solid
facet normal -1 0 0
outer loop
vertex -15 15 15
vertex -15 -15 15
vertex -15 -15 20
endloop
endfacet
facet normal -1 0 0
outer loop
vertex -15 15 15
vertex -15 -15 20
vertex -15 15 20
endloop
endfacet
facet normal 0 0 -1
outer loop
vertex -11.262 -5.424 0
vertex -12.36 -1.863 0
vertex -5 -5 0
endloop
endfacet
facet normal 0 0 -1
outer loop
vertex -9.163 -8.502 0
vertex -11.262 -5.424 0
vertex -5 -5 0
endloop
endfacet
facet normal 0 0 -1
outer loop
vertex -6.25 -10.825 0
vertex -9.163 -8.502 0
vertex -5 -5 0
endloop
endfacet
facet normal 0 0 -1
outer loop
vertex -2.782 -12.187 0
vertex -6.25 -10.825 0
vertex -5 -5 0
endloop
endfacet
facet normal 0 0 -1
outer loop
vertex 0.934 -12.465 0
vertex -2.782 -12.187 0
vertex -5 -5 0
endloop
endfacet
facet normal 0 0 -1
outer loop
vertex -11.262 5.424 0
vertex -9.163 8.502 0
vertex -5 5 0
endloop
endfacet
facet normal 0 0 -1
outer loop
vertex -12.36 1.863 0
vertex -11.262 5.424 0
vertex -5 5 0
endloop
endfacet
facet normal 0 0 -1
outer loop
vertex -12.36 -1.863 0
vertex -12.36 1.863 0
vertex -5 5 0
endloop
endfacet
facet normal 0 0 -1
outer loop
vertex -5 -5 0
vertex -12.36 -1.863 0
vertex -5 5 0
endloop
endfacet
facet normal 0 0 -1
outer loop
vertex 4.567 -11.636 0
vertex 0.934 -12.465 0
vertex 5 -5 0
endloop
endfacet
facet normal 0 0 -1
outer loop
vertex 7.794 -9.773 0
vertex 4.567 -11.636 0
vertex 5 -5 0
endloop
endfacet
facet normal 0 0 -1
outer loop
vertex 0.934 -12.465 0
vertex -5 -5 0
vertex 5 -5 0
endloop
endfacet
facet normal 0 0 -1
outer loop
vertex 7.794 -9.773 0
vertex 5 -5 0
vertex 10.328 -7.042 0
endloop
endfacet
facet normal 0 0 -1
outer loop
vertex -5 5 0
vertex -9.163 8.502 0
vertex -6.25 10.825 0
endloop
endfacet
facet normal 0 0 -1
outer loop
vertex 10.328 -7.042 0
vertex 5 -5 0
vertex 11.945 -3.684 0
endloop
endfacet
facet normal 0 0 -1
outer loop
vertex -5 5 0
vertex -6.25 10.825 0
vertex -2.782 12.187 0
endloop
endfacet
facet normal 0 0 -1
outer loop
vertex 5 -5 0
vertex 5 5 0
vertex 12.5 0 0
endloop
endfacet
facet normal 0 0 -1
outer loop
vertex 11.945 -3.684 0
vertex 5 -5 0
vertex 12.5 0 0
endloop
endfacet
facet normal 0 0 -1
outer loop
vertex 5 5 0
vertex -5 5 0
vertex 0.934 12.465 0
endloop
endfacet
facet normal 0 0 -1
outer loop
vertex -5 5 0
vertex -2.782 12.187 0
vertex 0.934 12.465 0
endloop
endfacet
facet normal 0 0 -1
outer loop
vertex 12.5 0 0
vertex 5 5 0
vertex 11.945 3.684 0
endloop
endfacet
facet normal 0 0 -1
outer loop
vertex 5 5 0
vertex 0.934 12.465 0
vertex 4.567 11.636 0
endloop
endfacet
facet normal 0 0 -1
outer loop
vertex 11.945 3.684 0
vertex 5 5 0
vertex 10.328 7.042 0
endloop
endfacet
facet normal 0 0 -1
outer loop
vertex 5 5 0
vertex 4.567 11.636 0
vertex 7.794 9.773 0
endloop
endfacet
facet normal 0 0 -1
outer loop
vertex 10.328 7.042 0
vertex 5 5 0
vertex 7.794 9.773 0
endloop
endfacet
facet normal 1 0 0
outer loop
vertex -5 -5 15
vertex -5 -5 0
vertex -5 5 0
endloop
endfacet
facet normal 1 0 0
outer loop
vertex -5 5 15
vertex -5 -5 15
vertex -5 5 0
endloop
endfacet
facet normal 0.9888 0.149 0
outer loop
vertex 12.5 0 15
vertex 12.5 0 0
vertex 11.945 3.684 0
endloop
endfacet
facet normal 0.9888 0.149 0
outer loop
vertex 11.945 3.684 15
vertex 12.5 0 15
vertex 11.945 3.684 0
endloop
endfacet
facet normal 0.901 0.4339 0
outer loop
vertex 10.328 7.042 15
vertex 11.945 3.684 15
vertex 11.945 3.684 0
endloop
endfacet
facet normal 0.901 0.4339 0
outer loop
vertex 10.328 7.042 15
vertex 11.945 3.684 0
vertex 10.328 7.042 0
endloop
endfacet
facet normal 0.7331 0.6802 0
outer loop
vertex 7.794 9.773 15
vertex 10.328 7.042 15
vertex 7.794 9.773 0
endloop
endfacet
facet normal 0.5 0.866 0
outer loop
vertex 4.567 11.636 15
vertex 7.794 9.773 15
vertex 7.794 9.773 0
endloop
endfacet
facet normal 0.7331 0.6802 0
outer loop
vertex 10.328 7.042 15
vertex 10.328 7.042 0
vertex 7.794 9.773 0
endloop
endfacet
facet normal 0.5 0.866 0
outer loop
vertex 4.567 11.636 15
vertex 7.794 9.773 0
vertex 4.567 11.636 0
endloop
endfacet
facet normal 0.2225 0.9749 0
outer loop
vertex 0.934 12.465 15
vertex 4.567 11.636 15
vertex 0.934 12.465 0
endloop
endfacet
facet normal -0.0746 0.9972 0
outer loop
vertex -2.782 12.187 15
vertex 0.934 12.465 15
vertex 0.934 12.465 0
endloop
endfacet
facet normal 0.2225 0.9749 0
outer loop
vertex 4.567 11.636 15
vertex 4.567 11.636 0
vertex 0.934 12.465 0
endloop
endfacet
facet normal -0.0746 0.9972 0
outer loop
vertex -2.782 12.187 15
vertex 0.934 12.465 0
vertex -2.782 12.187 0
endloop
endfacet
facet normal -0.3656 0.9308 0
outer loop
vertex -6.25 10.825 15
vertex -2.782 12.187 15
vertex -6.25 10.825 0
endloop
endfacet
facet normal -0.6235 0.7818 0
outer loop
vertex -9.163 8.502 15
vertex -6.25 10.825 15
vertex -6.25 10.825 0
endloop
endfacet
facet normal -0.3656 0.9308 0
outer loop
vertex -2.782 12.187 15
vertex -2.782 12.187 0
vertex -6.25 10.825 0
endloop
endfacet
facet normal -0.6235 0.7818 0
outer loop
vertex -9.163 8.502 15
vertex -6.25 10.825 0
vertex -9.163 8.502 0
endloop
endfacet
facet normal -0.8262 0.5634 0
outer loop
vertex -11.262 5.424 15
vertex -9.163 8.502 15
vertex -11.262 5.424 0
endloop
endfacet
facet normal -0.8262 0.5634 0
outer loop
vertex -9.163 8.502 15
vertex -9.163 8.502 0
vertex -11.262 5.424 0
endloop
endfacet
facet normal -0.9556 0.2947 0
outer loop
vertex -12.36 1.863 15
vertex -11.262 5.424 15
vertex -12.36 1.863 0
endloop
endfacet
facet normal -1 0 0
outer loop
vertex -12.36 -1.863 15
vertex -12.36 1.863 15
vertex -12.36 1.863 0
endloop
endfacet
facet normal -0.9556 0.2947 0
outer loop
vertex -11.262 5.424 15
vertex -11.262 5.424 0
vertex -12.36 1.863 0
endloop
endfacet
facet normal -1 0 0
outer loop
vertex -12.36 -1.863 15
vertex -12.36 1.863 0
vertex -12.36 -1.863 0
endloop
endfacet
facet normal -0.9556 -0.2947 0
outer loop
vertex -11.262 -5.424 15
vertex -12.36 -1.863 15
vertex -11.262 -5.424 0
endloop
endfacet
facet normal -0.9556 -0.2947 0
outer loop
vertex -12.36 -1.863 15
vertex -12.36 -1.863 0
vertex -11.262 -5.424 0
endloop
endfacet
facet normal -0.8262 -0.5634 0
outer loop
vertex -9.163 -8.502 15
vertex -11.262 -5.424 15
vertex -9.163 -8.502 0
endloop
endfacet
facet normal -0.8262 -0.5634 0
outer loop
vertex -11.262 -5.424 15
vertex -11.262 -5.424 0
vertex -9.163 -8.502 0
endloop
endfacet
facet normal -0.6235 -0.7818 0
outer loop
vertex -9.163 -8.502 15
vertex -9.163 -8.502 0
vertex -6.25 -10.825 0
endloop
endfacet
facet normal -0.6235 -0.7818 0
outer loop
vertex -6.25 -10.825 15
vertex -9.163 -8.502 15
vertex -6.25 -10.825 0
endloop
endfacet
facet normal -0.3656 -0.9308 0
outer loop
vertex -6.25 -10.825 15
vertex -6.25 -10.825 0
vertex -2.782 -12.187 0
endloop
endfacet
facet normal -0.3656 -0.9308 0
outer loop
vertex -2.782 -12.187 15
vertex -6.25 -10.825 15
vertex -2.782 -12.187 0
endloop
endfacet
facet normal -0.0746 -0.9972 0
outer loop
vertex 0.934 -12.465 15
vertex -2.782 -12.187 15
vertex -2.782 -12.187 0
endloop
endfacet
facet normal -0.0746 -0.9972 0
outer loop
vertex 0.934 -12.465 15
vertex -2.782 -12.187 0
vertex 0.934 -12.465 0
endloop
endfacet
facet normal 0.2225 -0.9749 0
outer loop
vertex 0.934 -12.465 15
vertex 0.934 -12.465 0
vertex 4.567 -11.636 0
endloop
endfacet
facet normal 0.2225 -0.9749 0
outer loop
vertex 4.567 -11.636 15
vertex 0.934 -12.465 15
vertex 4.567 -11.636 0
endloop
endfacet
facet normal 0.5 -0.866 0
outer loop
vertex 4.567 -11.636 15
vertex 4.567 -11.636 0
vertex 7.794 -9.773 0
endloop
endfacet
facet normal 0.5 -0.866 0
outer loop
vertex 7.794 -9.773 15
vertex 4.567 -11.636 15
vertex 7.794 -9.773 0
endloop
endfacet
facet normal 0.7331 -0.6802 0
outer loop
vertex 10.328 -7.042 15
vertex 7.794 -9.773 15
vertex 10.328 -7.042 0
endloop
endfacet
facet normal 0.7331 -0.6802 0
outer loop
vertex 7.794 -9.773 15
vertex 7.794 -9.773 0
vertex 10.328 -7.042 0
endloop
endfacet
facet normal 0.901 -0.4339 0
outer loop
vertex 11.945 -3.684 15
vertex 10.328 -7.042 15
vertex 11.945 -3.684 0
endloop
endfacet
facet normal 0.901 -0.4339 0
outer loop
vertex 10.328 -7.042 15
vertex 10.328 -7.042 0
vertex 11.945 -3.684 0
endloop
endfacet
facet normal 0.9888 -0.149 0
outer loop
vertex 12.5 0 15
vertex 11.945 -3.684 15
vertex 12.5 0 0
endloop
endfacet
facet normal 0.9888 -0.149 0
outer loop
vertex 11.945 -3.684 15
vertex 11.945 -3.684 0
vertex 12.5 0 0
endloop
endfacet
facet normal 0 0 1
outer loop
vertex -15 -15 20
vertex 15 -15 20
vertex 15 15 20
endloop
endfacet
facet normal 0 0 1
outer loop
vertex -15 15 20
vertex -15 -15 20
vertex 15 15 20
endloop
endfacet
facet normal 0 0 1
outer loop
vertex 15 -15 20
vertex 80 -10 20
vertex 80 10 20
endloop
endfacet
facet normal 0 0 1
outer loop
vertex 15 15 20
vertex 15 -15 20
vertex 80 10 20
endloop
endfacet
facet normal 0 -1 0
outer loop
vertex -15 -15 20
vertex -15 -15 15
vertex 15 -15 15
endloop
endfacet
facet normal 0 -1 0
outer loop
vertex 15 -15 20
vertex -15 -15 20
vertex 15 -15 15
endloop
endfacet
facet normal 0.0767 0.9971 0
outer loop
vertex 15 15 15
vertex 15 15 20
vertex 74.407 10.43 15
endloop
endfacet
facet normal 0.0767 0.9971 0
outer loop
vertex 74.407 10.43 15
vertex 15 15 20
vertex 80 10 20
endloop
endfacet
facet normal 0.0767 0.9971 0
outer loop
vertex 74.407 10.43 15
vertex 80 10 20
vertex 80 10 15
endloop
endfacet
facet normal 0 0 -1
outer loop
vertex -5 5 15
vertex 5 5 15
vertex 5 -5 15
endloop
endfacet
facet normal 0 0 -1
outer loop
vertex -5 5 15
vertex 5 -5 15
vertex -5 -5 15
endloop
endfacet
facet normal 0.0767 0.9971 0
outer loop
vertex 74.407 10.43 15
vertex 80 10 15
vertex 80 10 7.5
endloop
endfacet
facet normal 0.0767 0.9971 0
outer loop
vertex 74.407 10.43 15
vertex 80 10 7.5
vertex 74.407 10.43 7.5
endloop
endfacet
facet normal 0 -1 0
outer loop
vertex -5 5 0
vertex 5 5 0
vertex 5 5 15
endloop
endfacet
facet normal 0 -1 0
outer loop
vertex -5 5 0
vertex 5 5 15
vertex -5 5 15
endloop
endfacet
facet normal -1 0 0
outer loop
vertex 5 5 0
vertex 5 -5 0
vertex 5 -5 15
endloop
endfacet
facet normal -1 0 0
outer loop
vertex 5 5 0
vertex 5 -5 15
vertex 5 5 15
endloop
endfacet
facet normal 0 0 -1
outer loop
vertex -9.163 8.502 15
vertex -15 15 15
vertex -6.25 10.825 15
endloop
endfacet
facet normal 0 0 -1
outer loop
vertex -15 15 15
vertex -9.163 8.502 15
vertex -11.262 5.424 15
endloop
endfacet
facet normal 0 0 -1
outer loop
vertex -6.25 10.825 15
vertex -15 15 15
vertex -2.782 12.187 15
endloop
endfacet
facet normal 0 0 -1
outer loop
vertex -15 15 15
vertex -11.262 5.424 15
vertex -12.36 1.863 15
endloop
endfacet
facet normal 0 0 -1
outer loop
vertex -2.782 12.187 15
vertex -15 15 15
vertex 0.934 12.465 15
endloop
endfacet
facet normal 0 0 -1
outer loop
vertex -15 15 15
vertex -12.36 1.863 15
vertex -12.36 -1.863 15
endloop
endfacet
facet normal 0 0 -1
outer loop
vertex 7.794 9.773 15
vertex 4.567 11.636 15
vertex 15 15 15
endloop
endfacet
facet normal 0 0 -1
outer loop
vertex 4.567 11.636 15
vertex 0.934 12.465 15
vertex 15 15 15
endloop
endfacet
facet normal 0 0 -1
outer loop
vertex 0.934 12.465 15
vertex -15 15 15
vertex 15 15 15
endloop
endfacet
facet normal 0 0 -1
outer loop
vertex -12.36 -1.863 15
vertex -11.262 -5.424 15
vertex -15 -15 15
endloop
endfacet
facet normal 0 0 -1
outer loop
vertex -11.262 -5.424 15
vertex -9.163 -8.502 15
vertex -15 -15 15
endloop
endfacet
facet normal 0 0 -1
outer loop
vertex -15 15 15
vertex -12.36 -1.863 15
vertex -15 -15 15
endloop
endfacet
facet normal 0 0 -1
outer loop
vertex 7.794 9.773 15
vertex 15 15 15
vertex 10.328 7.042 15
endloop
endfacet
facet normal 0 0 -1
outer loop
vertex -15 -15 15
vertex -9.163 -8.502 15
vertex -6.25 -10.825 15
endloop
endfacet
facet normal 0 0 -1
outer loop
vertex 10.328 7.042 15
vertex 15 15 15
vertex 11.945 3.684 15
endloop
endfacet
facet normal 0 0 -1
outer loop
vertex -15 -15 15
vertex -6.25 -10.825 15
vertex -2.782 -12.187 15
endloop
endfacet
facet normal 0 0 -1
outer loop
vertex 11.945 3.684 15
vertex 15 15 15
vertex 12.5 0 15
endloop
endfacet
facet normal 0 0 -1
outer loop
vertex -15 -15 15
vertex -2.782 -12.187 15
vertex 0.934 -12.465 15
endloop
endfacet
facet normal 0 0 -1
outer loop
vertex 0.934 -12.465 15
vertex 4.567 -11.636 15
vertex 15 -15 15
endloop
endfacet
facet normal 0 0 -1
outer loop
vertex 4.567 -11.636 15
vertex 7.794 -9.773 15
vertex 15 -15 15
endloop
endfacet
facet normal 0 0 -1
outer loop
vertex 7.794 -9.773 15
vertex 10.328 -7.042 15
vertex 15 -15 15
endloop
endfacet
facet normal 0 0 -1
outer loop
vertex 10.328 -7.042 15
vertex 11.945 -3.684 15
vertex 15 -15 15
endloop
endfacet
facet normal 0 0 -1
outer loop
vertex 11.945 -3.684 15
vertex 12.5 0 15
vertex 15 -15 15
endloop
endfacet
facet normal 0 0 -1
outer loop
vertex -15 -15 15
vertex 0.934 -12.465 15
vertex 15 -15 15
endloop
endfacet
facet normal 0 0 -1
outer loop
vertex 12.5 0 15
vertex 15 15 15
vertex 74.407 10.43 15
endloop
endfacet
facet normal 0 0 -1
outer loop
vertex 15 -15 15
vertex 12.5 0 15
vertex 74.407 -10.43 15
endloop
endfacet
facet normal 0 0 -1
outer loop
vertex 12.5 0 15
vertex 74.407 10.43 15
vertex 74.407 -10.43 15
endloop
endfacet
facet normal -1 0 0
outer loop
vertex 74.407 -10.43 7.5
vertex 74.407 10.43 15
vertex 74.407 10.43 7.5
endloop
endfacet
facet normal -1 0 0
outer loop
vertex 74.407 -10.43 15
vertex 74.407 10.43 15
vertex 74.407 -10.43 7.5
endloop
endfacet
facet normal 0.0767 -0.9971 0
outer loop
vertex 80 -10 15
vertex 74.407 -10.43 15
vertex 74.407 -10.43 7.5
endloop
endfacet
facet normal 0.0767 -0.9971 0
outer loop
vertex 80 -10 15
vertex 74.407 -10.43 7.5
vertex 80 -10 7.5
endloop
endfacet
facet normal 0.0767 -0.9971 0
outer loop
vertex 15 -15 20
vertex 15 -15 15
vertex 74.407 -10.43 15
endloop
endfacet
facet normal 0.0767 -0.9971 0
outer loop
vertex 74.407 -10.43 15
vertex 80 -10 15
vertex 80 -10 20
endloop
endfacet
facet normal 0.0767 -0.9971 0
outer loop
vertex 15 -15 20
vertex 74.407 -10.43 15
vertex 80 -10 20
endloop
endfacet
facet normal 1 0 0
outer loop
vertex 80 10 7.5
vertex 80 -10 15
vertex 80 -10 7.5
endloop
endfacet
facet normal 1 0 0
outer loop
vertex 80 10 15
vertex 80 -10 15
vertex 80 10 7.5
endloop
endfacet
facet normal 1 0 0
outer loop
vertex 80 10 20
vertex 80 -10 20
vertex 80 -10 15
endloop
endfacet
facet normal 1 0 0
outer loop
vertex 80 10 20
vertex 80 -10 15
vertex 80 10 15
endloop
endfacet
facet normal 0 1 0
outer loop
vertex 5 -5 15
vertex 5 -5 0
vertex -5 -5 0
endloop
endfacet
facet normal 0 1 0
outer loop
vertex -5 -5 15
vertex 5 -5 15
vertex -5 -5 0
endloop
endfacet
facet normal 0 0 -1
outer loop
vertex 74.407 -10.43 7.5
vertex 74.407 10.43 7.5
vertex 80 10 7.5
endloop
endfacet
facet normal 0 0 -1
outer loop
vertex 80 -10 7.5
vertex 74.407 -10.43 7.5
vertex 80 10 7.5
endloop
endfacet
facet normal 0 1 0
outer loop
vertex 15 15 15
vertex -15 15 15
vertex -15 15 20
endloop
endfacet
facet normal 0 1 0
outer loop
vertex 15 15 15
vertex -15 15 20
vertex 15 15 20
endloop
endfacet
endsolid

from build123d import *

# Parameters (mm, degrees)
SKETCH2_R           = 12.5
BOSS_EXTRUDE1_DEPTH = 15
SKETCH3_W           = 30
SKETCH3_H           = 30
BOSS_EXTRUDE2_DEPTH = 5
SKETCH6_W           = 10
SKETCH6_H           = 10
CUT_EXTRUDE1_DEPTH  = 15
BOSS_EXTRUDE3_DEPTH = 7.5


with BuildPart() as part:
    # Sketch2 → Boss-Extrude1 (new body)
    with BuildSketch(Plane.XY):
        Circle(SKETCH2_R)
    extrude(amount=BOSS_EXTRUDE1_DEPTH)

    # Sketch3 → Boss-Extrude2 (add)
    with BuildSketch(Plane.XY.offset(15)):
        Rectangle(SKETCH3_W, SKETCH3_H)
    extrude(amount=BOSS_EXTRUDE2_DEPTH)

    # Sketch5 → Loft1 section 0
    with BuildSketch(Plane(origin=(15, 0, 0), x_dir=(0, 0, -1), z_dir=(1, 0, 0))):
        with BuildLine():
            Line((-20, 15), (-15, 15))
            Line((-15, 15), (-15, -15))
            Line((-15, -15), (-20, -15))
            Line((-20, -15), (-20, 15))
        make_face()
    # Sketch4 → Loft1 section 1
    with BuildSketch(Plane(origin=(80, 0, 0), x_dir=(0, 0, -1), z_dir=(1, 0, 0))):
        with BuildLine():
            Line((-20, 10), (-15, 10))
            Line((-15, 10), (-15, -10))
            Line((-15, -10), (-20, -10))
            Line((-20, -10), (-20, 10))
        make_face()
    loft()

    # Sketch6 → Cut-Extrude1 (cut)
    with BuildSketch(Plane(origin=(0, 0, 0), x_dir=(-1, 0, 0), z_dir=(0, 0, -1))):
        Rectangle(SKETCH6_W, SKETCH6_H)
    extrude(amount=-CUT_EXTRUDE1_DEPTH, mode=Mode.SUBTRACT)

    # Sketch7 → Boss-Extrude3 (add)
    with BuildSketch(Plane(origin=(0, 0, 15), x_dir=(-1, 0, 0), z_dir=(0, 0, -1))):
        Polygon((-74.407472361, 10.430194434), (-74.407472361, -10.430194434), (-80, -10), (-80, 10), align=None)
    extrude(amount=BOSS_EXTRUDE3_DEPTH)


solid = part.part
